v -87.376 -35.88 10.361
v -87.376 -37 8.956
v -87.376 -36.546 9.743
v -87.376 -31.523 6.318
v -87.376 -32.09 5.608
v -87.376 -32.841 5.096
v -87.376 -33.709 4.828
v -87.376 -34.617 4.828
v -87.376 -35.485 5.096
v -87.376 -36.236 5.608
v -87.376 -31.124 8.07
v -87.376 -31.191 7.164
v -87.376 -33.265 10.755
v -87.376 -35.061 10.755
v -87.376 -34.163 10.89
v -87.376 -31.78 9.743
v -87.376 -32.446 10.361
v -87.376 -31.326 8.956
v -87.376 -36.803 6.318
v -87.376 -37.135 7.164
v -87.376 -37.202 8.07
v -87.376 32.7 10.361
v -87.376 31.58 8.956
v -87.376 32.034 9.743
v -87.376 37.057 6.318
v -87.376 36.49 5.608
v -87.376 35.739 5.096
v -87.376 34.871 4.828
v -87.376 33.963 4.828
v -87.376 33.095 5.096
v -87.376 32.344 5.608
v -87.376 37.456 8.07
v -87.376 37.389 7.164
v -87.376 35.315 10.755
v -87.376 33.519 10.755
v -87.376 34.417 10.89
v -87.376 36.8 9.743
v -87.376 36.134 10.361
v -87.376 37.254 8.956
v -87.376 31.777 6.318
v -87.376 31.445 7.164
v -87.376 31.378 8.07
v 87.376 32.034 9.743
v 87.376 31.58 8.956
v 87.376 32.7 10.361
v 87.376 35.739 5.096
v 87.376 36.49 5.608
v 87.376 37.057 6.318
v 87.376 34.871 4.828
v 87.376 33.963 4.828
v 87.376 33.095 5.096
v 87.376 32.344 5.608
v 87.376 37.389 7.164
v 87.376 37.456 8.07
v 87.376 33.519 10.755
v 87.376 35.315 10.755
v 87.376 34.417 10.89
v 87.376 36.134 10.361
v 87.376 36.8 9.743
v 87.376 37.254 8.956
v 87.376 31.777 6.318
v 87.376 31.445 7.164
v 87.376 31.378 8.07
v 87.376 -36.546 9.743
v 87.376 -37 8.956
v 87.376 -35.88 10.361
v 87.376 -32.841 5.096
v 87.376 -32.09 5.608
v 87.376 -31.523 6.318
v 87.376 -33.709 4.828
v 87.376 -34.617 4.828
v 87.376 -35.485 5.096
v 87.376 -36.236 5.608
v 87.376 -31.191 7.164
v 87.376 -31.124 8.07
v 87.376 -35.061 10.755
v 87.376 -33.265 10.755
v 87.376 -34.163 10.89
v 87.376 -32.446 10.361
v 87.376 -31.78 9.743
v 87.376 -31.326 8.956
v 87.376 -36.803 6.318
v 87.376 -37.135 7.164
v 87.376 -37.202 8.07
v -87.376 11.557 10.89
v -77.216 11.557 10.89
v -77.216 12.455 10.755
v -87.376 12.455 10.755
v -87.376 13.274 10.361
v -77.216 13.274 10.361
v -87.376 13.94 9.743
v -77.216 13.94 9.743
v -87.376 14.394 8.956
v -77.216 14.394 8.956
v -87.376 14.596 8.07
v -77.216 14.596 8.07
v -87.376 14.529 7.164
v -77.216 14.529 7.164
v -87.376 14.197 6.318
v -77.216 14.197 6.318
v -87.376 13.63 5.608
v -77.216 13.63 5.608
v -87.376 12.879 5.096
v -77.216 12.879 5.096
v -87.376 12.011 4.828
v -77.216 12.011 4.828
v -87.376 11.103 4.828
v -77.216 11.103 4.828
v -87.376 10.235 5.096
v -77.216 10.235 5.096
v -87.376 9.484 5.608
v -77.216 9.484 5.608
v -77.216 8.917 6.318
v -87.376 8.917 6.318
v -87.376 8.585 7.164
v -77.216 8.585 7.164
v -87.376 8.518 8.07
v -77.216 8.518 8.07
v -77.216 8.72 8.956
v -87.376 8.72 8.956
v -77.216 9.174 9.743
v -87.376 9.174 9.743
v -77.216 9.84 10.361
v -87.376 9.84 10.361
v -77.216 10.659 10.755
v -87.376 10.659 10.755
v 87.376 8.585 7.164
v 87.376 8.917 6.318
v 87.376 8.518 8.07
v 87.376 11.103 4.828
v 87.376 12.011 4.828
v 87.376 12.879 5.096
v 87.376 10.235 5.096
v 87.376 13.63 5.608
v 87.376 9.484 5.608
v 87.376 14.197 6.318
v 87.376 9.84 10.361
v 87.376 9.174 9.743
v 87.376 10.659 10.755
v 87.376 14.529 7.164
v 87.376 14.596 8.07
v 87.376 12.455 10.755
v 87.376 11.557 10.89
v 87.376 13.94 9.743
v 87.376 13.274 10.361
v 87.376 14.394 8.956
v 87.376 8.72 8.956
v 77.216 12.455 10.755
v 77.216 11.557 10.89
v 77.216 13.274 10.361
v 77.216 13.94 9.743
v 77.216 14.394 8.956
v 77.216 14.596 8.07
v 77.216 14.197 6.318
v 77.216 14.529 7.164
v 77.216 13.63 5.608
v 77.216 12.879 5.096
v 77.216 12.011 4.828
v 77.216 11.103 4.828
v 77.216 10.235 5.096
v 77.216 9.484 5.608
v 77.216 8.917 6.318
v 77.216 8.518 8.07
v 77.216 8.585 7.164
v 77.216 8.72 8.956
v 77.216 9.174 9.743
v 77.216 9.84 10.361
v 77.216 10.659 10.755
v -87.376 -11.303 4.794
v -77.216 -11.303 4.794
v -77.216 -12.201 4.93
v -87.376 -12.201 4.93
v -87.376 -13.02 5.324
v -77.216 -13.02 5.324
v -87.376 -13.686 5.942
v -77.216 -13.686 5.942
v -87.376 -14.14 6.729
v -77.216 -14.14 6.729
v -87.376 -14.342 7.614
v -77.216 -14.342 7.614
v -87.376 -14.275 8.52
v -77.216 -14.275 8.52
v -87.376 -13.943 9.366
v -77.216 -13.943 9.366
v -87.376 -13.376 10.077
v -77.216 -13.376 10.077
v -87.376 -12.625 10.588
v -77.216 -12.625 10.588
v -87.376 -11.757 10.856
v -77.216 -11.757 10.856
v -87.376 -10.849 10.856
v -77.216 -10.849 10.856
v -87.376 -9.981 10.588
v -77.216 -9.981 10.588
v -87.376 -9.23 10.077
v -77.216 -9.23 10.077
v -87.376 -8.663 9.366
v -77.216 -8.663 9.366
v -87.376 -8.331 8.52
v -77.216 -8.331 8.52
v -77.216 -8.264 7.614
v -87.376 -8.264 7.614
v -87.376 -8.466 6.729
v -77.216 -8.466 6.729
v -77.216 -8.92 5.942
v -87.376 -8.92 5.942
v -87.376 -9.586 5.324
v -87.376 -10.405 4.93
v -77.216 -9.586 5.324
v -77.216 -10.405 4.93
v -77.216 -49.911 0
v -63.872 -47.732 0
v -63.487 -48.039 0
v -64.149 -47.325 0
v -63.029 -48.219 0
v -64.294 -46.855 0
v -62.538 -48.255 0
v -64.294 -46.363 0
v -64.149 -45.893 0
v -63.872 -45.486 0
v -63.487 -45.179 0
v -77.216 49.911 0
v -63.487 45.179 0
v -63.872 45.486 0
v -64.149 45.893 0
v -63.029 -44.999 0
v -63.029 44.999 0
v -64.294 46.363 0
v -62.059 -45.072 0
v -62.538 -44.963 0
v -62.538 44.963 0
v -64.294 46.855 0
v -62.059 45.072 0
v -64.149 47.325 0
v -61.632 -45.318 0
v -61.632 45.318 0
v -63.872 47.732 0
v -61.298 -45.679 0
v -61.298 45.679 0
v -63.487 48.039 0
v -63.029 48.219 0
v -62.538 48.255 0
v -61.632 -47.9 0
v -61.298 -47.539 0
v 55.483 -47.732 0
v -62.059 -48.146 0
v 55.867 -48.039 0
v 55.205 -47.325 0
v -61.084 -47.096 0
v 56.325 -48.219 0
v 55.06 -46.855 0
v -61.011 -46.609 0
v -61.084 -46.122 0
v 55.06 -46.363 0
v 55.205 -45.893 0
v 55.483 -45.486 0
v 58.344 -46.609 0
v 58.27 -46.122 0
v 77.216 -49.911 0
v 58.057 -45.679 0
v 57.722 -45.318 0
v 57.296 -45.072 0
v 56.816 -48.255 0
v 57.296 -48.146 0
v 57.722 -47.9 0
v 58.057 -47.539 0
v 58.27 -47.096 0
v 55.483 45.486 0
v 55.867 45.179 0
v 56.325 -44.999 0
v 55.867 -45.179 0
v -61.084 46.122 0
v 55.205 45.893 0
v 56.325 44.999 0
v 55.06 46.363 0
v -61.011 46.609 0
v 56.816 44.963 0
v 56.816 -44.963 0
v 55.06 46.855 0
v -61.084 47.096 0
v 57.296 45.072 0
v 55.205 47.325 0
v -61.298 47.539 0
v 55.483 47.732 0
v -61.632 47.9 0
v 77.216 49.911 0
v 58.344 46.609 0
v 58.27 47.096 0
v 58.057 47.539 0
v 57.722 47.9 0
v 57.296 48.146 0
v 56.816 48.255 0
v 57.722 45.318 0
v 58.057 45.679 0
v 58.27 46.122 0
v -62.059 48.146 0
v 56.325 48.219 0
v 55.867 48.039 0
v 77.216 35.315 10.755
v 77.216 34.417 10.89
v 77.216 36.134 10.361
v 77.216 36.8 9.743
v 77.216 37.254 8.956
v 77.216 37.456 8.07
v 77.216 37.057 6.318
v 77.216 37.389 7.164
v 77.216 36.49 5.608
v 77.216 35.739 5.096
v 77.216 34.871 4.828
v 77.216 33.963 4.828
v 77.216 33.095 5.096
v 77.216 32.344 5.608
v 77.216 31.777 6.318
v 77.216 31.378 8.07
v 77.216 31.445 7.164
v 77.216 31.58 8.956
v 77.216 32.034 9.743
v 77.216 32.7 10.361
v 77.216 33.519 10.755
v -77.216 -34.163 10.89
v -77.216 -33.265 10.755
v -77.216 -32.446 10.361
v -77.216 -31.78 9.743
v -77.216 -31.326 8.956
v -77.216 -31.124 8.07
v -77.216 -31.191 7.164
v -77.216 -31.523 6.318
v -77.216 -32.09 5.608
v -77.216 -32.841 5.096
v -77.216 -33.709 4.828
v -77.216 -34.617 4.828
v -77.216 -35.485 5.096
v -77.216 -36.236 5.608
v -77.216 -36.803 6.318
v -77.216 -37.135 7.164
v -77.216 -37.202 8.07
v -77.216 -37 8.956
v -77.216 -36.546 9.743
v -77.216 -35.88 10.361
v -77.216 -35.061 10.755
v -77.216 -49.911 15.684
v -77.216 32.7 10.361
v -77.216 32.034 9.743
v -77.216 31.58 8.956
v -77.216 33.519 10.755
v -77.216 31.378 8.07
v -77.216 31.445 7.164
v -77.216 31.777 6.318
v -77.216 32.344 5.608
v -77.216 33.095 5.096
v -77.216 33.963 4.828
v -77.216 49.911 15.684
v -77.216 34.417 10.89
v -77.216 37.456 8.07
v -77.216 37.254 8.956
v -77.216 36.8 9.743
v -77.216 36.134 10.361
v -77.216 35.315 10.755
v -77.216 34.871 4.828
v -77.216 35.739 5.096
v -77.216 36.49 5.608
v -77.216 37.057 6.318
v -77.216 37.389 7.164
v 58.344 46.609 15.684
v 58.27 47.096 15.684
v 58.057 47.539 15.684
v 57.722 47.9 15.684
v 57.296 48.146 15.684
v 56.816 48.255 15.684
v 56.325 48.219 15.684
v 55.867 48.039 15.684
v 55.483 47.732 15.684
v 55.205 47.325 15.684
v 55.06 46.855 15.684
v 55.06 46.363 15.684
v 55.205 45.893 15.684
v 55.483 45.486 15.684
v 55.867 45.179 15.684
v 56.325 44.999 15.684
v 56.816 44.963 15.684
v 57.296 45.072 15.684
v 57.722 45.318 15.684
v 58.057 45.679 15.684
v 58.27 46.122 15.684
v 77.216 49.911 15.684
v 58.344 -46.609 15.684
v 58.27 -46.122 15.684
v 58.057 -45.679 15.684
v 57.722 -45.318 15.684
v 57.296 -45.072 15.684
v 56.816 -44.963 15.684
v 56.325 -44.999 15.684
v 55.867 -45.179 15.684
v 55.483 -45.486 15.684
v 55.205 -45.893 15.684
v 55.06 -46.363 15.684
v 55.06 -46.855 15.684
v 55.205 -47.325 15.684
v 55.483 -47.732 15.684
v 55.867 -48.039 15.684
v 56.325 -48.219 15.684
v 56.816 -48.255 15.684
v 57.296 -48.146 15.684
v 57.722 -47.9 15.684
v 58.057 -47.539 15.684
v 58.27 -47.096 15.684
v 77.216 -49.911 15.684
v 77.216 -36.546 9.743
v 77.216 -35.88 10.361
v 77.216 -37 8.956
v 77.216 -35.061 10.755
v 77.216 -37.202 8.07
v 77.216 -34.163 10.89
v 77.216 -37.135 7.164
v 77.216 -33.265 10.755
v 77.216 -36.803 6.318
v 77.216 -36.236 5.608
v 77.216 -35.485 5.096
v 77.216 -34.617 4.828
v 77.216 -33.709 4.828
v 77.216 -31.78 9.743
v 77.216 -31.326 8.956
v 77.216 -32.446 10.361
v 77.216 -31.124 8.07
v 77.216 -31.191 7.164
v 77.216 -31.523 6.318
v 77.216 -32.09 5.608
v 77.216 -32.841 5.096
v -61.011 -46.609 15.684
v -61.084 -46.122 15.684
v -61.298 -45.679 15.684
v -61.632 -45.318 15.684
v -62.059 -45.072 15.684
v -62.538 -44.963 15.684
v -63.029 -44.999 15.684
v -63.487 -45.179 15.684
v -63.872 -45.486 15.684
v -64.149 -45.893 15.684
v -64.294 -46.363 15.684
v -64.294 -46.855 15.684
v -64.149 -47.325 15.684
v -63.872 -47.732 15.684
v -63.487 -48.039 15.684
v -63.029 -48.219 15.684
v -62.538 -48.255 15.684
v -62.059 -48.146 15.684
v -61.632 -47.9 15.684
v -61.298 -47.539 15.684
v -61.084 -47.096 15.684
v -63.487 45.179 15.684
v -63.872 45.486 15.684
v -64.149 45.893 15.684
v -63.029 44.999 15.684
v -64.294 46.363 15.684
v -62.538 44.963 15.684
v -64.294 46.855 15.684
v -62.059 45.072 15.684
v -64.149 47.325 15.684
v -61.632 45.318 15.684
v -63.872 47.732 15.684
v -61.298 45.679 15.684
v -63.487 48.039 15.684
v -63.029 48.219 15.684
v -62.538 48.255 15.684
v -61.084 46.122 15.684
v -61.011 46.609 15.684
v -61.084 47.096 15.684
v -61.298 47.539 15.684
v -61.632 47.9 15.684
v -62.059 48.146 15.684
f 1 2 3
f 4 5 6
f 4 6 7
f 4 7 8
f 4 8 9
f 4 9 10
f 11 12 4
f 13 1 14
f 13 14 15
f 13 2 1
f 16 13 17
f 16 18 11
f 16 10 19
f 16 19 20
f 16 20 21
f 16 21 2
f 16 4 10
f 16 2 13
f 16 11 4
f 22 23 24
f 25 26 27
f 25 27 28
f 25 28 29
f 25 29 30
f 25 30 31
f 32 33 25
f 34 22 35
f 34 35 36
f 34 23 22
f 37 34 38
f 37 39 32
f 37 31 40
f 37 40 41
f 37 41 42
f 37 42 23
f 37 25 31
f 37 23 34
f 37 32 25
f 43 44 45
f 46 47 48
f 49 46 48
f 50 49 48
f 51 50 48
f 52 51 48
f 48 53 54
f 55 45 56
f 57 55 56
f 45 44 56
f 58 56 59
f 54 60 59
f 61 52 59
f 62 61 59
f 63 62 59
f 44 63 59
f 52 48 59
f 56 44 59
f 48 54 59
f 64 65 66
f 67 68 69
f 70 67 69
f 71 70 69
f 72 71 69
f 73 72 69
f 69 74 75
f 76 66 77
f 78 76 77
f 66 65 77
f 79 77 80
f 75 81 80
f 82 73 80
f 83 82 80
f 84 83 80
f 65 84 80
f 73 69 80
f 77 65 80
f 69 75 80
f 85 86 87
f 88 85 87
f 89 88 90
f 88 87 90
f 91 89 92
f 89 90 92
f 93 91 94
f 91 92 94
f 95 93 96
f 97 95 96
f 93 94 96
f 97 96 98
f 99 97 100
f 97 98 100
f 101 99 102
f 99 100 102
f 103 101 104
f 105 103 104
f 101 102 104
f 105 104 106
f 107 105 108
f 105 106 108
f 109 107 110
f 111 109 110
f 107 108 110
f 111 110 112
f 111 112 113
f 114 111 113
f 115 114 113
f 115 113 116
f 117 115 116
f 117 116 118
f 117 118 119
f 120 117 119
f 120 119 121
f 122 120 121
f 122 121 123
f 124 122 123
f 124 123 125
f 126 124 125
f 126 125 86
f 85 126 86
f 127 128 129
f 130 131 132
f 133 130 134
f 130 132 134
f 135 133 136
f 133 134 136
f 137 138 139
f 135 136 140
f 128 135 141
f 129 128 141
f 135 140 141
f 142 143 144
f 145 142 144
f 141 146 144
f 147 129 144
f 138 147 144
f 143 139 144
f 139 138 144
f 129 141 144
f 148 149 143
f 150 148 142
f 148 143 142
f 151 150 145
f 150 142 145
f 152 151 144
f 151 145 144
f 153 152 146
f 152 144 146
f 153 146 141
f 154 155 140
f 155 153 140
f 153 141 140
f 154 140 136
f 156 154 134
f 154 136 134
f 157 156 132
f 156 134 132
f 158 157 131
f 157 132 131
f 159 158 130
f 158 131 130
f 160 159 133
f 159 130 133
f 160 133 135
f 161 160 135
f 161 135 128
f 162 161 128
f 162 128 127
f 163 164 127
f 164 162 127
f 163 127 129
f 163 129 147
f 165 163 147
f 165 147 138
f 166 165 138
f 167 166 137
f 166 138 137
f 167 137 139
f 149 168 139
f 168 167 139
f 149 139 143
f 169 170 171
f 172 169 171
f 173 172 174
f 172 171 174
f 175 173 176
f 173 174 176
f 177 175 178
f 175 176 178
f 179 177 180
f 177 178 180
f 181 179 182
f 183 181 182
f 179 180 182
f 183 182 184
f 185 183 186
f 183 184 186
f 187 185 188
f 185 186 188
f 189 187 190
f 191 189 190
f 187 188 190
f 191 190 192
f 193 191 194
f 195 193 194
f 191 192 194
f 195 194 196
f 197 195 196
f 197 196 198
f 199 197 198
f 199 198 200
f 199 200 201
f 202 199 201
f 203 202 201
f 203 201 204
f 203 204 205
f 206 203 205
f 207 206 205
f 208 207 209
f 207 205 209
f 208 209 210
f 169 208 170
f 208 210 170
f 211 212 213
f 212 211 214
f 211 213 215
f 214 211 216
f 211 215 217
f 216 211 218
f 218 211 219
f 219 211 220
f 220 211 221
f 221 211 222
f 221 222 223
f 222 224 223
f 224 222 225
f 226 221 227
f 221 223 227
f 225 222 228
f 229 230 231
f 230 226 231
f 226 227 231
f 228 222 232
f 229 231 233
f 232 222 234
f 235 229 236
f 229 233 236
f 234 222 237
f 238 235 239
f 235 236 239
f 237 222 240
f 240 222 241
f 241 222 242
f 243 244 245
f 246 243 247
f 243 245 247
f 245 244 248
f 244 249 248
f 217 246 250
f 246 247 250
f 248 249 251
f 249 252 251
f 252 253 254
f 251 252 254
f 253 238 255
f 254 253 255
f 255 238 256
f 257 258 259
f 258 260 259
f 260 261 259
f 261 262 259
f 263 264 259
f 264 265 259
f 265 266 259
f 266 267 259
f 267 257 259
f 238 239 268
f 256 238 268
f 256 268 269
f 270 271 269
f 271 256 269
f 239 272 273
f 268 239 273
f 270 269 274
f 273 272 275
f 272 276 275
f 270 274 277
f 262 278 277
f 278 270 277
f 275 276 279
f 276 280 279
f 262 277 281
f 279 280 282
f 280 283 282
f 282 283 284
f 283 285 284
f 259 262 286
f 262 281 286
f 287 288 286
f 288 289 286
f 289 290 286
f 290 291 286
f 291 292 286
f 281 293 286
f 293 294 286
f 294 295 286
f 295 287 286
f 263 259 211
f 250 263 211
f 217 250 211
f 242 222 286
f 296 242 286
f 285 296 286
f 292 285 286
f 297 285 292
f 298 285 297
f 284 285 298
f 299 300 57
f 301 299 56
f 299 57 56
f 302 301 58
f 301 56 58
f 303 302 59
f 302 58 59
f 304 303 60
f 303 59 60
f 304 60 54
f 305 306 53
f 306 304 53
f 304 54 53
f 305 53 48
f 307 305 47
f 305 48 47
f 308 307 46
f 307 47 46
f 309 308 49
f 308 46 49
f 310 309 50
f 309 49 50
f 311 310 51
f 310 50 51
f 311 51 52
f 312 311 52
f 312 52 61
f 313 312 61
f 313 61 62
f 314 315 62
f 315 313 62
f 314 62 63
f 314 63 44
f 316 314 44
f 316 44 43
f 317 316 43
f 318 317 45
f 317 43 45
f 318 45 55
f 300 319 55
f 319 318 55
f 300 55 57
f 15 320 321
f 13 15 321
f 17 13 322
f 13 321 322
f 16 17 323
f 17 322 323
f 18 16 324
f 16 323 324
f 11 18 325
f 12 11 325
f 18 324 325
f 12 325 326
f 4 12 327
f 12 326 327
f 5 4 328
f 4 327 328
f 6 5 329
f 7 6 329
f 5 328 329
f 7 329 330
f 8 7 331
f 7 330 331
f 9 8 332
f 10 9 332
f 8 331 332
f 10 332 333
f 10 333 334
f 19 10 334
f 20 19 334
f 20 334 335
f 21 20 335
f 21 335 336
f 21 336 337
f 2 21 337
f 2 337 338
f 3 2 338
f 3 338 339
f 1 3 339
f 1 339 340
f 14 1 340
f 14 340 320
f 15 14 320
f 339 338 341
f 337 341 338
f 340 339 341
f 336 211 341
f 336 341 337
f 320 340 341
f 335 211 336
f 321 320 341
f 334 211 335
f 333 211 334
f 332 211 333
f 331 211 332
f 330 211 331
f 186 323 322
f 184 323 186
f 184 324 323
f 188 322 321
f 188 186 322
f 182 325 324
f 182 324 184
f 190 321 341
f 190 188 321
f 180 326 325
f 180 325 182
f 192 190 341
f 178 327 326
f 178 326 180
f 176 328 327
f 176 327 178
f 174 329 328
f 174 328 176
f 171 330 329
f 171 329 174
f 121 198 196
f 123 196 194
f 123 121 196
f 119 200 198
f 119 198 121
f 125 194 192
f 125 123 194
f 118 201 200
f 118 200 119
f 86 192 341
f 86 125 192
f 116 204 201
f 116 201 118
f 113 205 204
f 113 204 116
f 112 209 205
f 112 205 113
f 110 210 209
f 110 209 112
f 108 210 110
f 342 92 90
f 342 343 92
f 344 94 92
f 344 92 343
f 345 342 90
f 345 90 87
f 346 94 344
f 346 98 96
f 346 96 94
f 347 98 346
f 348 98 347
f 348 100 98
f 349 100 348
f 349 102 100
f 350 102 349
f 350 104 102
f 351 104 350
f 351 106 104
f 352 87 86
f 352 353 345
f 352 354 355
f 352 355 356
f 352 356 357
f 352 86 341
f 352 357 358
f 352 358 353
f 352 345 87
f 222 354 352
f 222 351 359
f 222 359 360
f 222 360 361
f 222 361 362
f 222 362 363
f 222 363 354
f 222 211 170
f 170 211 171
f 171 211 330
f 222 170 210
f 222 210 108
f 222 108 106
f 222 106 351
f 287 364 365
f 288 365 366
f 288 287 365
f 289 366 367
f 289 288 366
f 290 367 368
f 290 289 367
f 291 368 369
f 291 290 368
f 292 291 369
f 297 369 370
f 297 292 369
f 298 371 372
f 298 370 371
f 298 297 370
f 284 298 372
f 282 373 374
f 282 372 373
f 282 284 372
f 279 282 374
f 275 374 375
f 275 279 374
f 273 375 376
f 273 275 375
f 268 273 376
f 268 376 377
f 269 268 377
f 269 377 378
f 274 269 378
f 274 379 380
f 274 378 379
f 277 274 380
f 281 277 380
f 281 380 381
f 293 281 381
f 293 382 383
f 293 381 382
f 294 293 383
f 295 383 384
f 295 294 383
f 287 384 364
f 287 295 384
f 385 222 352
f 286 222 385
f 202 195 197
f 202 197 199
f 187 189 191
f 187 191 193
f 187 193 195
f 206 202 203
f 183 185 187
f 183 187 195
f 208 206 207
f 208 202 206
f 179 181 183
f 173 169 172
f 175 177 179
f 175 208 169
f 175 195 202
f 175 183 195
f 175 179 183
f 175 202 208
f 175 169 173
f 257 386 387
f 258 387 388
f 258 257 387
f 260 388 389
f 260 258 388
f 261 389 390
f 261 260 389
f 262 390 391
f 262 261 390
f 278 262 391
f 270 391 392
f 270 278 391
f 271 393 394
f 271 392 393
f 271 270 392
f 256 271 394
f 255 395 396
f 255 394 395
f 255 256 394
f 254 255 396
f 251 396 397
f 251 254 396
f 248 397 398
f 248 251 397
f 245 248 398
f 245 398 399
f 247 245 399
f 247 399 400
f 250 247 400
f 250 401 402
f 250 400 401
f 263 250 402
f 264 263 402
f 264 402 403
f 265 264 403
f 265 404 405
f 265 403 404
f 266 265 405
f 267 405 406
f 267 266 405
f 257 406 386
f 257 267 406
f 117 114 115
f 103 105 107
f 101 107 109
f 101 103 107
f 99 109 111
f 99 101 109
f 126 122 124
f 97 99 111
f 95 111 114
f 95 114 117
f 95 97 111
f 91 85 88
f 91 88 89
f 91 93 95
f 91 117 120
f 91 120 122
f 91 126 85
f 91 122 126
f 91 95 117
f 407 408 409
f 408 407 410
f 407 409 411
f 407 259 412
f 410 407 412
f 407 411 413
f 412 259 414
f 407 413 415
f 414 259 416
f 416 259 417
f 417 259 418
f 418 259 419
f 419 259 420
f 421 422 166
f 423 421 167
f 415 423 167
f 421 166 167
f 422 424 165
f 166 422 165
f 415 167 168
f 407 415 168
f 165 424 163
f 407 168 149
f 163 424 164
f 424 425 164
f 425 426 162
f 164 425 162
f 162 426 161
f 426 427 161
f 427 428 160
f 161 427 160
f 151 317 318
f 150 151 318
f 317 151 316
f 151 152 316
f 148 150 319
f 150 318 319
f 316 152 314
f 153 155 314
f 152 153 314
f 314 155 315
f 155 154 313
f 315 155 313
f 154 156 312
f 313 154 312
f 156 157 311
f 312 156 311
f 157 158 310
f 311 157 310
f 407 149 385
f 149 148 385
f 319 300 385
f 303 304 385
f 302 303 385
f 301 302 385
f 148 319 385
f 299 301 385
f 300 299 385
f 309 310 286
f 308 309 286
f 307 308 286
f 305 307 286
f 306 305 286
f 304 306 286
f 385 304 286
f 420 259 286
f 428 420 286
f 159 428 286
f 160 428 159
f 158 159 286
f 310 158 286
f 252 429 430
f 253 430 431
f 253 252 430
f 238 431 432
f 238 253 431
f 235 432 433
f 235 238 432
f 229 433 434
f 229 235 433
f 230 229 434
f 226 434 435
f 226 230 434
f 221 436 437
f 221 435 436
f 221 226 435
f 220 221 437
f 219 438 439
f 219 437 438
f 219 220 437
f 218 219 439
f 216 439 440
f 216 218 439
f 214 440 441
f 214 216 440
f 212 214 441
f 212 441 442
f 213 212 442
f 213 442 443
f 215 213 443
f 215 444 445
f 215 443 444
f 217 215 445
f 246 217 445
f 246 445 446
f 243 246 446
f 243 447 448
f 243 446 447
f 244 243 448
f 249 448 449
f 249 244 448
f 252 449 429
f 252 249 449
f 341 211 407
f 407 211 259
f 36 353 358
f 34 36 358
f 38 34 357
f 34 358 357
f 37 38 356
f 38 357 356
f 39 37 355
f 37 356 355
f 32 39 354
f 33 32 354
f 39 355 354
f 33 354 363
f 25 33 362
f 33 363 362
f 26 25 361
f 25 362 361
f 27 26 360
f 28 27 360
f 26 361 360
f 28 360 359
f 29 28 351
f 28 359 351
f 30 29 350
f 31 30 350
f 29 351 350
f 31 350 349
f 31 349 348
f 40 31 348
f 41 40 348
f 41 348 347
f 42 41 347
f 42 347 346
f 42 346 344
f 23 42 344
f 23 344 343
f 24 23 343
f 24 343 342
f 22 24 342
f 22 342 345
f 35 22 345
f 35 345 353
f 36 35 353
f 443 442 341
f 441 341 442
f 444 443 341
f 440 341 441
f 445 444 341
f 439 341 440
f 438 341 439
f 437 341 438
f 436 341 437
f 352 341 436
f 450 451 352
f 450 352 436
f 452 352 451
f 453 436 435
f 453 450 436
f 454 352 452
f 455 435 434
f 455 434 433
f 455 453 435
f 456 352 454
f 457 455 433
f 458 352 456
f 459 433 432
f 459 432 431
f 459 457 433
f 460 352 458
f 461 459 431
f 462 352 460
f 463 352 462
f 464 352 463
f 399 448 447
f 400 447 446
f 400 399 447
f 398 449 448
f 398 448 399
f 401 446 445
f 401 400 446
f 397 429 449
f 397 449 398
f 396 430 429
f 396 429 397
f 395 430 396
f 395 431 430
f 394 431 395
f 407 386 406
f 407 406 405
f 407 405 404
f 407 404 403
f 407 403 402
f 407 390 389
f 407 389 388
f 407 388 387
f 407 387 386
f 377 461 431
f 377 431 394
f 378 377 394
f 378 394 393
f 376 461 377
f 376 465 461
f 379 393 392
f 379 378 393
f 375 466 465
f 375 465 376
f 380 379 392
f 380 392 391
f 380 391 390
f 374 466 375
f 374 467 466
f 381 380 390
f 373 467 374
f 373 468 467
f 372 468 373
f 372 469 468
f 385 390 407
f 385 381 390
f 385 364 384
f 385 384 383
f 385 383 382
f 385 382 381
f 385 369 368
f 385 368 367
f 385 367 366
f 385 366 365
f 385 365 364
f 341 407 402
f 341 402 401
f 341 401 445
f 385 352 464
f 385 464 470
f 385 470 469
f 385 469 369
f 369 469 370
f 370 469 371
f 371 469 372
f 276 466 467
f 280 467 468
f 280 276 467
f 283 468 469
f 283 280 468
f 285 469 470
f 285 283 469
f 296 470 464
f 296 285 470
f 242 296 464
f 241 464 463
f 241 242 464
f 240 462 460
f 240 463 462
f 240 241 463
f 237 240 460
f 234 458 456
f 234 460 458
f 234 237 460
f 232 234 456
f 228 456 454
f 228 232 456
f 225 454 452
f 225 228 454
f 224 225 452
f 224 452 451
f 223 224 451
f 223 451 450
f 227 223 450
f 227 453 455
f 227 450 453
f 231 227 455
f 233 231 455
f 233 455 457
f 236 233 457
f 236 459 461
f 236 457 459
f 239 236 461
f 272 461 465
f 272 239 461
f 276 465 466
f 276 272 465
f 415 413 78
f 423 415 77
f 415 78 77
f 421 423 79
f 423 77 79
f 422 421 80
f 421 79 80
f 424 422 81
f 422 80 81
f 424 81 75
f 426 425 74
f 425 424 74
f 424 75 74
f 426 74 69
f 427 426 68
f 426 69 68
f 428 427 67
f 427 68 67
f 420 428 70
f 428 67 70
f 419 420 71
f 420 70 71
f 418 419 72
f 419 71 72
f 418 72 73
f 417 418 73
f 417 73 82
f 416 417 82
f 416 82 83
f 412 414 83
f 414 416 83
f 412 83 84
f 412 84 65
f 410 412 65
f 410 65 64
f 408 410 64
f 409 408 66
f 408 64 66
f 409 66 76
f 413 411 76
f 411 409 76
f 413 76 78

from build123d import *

# Parameters (mm, degrees)
SKETCH1_W                = 154.432
SKETCH1_H                = 99.822
BOSS_EXTRUDE1_DEPTH      = 15.6845
BOSS_EXTRUDE2_DEPTH      = 10.16
BOSS_EXTRUDE2_DEPTH_BACK = 164.592
SKETCH2_R                = 3.048
SKETCH2_3_R              = 3.048
BOSS_EXTRUDE3_DEPTH      = 10.16
SKETCH3_R                = 1.651
CUT_EXTRUDE1_DEPTH       = 102.841429866


with BuildPart() as part:
    # Sketch1 → Boss-Extrude1 (new body)
    with BuildSketch(Plane.XY):
        Rectangle(SKETCH1_W, SKETCH1_H)
    extrude(amount=BOSS_EXTRUDE1_DEPTH)

    # Sketch2 → Boss-Extrude2 (add, two sides: drawn at the far end of the back side and taken through both)
    with BuildSketch(Plane.ZY.offset(77.216).offset(-BOSS_EXTRUDE2_DEPTH_BACK)):
        with Locations((7.84225, 34.417)):
            Circle(SKETCH2_R)
        with Locations((7.84225, 11.557)):
            Circle(SKETCH2_R)
        with Locations((7.84225, -34.163)):
            Circle(SKETCH2_R)
    extrude(amount=BOSS_EXTRUDE2_DEPTH + BOSS_EXTRUDE2_DEPTH_BACK)

    # Sketch2<3> → Boss-Extrude3 (add)
    with BuildSketch(Plane.ZY.offset(77.216)):
        with Locations(Location((7.84225, -11.303, 0), (0, 0, 180))):
            Circle(SKETCH2_3_R)
    extrude(amount=BOSS_EXTRUDE3_DEPTH)

    # Sketch3 → Cut-Extrude1 (cut, through all)
    with BuildSketch(Plane.XY):
        with Locations((-62.6618, 46.609)):
            Circle(SKETCH3_R)
        with Locations((-62.6618, -46.609)):
            Circle(SKETCH3_R)
        with Locations((56.6928, -46.609)):
            Circle(SKETCH3_R)
        with Locations((56.6928, 46.609)):
            Circle(SKETCH3_R)
    extrude(amount=CUT_EXTRUDE1_DEPTH, mode=Mode.SUBTRACT)


solid = part.part
